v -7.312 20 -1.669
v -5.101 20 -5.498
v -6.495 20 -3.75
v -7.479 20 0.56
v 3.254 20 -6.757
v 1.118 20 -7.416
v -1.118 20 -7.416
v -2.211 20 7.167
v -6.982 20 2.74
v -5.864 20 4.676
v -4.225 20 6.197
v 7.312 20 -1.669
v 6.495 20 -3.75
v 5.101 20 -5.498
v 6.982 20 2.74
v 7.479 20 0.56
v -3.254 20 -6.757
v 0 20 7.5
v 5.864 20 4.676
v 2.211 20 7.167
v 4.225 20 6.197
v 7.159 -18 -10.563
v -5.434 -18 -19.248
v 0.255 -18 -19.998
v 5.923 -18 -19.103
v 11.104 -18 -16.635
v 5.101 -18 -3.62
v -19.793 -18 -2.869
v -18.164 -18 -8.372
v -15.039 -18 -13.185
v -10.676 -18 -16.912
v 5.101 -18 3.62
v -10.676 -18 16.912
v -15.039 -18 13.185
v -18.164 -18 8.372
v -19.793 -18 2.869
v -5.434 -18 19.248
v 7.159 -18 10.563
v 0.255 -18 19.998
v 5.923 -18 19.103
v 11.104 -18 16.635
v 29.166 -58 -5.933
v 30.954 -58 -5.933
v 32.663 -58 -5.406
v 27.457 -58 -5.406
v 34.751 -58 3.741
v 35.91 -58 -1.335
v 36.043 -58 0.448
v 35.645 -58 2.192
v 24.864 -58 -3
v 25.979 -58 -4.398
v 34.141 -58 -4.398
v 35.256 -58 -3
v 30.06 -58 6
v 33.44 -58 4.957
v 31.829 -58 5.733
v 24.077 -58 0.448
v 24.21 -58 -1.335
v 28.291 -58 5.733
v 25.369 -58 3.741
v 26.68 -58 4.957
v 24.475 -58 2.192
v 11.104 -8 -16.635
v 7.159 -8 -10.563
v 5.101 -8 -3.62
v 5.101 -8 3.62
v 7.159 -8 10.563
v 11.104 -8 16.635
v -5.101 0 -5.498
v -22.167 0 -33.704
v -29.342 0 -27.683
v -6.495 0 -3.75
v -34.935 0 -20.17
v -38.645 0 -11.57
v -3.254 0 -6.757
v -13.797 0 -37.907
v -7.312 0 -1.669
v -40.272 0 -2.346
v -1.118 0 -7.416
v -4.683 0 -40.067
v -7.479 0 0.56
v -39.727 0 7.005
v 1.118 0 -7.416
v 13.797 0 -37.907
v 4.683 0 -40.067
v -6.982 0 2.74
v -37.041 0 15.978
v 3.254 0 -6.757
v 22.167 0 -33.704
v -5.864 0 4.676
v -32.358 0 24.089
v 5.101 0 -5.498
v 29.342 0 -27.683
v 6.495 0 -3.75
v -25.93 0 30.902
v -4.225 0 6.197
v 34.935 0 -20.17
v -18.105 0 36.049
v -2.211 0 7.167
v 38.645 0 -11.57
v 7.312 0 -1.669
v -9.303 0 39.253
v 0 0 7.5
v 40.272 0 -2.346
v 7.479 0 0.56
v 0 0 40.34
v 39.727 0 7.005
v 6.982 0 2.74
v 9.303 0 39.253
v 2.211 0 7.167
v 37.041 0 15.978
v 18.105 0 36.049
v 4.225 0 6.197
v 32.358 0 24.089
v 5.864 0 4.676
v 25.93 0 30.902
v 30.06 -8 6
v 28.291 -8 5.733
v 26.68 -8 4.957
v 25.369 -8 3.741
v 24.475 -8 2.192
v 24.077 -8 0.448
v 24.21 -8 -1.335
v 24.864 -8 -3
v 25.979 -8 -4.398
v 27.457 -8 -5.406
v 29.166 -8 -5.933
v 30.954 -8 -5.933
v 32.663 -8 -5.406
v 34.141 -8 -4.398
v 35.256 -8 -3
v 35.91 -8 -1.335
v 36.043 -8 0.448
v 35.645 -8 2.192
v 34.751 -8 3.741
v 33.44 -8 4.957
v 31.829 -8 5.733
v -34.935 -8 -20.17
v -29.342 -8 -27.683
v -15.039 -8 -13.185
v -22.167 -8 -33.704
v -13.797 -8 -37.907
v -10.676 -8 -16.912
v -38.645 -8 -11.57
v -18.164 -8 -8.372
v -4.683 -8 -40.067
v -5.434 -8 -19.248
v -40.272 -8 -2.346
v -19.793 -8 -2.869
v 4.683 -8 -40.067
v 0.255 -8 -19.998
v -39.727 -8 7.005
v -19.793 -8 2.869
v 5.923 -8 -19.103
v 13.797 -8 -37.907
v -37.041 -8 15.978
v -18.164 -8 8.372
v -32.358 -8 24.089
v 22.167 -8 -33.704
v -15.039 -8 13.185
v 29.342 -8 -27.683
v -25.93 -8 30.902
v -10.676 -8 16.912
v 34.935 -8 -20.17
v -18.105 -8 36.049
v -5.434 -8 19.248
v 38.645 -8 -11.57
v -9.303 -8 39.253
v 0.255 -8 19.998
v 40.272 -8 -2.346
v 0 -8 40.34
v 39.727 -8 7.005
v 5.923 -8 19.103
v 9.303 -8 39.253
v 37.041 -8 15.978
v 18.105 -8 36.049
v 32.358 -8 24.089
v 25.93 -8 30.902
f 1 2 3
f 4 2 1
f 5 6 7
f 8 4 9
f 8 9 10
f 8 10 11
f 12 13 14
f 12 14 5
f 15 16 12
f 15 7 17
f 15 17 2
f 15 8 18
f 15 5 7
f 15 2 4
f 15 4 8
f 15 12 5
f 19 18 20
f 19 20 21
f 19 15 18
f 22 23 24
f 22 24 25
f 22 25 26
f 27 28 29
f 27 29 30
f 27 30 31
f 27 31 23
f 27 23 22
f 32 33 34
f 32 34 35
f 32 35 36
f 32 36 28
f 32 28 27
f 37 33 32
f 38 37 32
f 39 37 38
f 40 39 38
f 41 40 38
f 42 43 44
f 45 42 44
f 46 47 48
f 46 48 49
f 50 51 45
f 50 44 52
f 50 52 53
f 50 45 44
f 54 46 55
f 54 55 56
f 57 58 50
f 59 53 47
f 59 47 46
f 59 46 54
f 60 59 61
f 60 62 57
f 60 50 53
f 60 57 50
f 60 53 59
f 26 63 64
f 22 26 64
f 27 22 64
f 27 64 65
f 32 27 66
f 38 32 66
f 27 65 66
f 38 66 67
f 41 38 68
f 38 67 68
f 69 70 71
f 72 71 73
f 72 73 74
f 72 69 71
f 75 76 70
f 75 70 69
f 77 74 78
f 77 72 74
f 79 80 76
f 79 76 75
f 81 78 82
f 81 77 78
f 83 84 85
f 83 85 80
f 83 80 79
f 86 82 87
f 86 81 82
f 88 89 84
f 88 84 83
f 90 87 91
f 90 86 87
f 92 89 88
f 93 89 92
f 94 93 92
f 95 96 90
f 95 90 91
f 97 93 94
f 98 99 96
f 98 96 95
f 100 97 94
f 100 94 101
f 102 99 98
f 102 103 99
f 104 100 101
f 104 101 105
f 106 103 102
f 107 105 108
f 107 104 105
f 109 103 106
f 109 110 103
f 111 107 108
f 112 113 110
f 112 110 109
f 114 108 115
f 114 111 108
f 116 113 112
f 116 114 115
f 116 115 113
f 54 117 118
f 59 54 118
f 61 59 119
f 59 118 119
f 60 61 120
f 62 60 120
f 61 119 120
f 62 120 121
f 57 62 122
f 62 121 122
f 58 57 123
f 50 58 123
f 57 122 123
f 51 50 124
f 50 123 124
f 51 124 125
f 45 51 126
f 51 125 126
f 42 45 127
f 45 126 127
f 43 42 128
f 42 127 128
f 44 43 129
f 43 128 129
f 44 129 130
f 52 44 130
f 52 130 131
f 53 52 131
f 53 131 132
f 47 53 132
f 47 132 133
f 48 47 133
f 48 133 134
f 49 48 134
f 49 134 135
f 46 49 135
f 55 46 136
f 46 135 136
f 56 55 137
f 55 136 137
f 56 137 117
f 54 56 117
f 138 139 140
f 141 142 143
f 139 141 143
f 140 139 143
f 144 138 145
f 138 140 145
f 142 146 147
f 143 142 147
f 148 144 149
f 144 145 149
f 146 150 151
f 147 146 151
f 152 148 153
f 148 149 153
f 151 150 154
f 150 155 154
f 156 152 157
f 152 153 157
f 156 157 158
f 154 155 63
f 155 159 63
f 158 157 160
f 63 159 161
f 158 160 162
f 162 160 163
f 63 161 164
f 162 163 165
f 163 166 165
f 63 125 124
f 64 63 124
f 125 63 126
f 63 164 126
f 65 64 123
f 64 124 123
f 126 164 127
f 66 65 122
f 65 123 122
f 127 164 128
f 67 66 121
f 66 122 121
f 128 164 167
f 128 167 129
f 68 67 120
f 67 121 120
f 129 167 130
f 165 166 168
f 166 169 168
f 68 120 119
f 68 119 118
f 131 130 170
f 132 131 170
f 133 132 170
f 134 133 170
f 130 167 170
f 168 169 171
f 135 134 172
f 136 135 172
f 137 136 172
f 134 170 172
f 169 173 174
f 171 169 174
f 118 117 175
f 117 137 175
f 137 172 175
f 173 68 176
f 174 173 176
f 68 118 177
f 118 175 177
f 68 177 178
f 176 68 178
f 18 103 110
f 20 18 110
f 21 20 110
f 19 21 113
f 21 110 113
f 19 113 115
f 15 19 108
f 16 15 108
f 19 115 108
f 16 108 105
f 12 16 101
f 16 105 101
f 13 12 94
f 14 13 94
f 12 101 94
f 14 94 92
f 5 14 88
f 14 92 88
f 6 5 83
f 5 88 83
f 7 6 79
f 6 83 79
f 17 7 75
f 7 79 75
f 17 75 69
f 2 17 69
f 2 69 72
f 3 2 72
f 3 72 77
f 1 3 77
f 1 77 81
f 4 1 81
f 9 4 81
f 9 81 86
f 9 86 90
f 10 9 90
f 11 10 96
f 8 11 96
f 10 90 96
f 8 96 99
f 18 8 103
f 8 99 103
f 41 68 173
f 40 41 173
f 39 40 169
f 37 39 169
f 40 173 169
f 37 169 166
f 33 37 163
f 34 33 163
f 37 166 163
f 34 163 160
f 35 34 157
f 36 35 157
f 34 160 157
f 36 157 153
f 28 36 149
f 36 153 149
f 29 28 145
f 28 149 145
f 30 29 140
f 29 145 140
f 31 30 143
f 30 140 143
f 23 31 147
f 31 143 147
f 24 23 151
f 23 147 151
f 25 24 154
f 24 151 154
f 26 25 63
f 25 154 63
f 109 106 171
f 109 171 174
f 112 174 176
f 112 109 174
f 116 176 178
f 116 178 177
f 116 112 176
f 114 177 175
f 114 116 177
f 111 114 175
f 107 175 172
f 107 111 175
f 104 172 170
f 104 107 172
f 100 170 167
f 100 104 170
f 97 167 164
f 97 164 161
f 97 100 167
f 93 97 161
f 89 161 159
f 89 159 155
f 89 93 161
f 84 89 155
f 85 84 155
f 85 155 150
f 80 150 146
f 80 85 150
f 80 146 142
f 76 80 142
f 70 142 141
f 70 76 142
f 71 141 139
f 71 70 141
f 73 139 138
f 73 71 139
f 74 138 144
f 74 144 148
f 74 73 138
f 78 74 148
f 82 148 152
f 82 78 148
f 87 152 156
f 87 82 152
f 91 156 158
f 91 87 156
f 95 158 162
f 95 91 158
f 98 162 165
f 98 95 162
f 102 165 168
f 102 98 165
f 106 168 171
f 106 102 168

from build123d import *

# Parameters (mm, degrees)
SKETCH1_R           = 40.34
BOSS_EXTRUDE1_DEPTH = 8
SKETCH2_R           = 7.5
BOSS_EXTRUDE2_DEPTH = 20
BOSS_EXTRUDE3_DEPTH = 10
SKETCH4_R           = 6
BOSS_EXTRUDE4_DEPTH = 50


with BuildPart() as part:
    # Sketch1 → Boss-Extrude1 (new body)
    with BuildSketch(Plane(origin=(0, 0, 0), x_dir=(1, 0, 0), z_dir=(0, 1, 0))):
        with Locations(Location((0, 0, 0), (0, 0, 270))):
            Circle(SKETCH1_R)
    extrude(amount=-BOSS_EXTRUDE1_DEPTH)

    # Sketch2 → Boss-Extrude2 (add)
    with BuildSketch(Plane(origin=(0, 0, 0), x_dir=(1, 0, 0), z_dir=(0, 1, 0))):
        with Locations(Location((0, 0, 0), (0, 0, 270))):
            Circle(SKETCH2_R)
    extrude(amount=BOSS_EXTRUDE2_DEPTH)

    # Sketch3 → Boss-Extrude3 (add)
    with BuildSketch(Plane.XZ.offset(8)):
        with BuildLine():
            ThreePointArc((11.103712575, 16.634529361), (-20, 0), (11.103712575, -16.634529361))
            ThreePointArc((11.103712575, -16.634529361), (4.84, 0), (11.103712575, 16.634529361))
        make_face()
    extrude(amount=BOSS_EXTRUDE3_DEPTH)

    # Sketch4 → Boss-Extrude4 (add)
    with BuildSketch(Plane.XZ.offset(8)):
        with Locations(Location((30.06, 0, 0), (0, 0, 90))):
            Circle(SKETCH4_R)
    extrude(amount=BOSS_EXTRUDE4_DEPTH)


solid = part.part
